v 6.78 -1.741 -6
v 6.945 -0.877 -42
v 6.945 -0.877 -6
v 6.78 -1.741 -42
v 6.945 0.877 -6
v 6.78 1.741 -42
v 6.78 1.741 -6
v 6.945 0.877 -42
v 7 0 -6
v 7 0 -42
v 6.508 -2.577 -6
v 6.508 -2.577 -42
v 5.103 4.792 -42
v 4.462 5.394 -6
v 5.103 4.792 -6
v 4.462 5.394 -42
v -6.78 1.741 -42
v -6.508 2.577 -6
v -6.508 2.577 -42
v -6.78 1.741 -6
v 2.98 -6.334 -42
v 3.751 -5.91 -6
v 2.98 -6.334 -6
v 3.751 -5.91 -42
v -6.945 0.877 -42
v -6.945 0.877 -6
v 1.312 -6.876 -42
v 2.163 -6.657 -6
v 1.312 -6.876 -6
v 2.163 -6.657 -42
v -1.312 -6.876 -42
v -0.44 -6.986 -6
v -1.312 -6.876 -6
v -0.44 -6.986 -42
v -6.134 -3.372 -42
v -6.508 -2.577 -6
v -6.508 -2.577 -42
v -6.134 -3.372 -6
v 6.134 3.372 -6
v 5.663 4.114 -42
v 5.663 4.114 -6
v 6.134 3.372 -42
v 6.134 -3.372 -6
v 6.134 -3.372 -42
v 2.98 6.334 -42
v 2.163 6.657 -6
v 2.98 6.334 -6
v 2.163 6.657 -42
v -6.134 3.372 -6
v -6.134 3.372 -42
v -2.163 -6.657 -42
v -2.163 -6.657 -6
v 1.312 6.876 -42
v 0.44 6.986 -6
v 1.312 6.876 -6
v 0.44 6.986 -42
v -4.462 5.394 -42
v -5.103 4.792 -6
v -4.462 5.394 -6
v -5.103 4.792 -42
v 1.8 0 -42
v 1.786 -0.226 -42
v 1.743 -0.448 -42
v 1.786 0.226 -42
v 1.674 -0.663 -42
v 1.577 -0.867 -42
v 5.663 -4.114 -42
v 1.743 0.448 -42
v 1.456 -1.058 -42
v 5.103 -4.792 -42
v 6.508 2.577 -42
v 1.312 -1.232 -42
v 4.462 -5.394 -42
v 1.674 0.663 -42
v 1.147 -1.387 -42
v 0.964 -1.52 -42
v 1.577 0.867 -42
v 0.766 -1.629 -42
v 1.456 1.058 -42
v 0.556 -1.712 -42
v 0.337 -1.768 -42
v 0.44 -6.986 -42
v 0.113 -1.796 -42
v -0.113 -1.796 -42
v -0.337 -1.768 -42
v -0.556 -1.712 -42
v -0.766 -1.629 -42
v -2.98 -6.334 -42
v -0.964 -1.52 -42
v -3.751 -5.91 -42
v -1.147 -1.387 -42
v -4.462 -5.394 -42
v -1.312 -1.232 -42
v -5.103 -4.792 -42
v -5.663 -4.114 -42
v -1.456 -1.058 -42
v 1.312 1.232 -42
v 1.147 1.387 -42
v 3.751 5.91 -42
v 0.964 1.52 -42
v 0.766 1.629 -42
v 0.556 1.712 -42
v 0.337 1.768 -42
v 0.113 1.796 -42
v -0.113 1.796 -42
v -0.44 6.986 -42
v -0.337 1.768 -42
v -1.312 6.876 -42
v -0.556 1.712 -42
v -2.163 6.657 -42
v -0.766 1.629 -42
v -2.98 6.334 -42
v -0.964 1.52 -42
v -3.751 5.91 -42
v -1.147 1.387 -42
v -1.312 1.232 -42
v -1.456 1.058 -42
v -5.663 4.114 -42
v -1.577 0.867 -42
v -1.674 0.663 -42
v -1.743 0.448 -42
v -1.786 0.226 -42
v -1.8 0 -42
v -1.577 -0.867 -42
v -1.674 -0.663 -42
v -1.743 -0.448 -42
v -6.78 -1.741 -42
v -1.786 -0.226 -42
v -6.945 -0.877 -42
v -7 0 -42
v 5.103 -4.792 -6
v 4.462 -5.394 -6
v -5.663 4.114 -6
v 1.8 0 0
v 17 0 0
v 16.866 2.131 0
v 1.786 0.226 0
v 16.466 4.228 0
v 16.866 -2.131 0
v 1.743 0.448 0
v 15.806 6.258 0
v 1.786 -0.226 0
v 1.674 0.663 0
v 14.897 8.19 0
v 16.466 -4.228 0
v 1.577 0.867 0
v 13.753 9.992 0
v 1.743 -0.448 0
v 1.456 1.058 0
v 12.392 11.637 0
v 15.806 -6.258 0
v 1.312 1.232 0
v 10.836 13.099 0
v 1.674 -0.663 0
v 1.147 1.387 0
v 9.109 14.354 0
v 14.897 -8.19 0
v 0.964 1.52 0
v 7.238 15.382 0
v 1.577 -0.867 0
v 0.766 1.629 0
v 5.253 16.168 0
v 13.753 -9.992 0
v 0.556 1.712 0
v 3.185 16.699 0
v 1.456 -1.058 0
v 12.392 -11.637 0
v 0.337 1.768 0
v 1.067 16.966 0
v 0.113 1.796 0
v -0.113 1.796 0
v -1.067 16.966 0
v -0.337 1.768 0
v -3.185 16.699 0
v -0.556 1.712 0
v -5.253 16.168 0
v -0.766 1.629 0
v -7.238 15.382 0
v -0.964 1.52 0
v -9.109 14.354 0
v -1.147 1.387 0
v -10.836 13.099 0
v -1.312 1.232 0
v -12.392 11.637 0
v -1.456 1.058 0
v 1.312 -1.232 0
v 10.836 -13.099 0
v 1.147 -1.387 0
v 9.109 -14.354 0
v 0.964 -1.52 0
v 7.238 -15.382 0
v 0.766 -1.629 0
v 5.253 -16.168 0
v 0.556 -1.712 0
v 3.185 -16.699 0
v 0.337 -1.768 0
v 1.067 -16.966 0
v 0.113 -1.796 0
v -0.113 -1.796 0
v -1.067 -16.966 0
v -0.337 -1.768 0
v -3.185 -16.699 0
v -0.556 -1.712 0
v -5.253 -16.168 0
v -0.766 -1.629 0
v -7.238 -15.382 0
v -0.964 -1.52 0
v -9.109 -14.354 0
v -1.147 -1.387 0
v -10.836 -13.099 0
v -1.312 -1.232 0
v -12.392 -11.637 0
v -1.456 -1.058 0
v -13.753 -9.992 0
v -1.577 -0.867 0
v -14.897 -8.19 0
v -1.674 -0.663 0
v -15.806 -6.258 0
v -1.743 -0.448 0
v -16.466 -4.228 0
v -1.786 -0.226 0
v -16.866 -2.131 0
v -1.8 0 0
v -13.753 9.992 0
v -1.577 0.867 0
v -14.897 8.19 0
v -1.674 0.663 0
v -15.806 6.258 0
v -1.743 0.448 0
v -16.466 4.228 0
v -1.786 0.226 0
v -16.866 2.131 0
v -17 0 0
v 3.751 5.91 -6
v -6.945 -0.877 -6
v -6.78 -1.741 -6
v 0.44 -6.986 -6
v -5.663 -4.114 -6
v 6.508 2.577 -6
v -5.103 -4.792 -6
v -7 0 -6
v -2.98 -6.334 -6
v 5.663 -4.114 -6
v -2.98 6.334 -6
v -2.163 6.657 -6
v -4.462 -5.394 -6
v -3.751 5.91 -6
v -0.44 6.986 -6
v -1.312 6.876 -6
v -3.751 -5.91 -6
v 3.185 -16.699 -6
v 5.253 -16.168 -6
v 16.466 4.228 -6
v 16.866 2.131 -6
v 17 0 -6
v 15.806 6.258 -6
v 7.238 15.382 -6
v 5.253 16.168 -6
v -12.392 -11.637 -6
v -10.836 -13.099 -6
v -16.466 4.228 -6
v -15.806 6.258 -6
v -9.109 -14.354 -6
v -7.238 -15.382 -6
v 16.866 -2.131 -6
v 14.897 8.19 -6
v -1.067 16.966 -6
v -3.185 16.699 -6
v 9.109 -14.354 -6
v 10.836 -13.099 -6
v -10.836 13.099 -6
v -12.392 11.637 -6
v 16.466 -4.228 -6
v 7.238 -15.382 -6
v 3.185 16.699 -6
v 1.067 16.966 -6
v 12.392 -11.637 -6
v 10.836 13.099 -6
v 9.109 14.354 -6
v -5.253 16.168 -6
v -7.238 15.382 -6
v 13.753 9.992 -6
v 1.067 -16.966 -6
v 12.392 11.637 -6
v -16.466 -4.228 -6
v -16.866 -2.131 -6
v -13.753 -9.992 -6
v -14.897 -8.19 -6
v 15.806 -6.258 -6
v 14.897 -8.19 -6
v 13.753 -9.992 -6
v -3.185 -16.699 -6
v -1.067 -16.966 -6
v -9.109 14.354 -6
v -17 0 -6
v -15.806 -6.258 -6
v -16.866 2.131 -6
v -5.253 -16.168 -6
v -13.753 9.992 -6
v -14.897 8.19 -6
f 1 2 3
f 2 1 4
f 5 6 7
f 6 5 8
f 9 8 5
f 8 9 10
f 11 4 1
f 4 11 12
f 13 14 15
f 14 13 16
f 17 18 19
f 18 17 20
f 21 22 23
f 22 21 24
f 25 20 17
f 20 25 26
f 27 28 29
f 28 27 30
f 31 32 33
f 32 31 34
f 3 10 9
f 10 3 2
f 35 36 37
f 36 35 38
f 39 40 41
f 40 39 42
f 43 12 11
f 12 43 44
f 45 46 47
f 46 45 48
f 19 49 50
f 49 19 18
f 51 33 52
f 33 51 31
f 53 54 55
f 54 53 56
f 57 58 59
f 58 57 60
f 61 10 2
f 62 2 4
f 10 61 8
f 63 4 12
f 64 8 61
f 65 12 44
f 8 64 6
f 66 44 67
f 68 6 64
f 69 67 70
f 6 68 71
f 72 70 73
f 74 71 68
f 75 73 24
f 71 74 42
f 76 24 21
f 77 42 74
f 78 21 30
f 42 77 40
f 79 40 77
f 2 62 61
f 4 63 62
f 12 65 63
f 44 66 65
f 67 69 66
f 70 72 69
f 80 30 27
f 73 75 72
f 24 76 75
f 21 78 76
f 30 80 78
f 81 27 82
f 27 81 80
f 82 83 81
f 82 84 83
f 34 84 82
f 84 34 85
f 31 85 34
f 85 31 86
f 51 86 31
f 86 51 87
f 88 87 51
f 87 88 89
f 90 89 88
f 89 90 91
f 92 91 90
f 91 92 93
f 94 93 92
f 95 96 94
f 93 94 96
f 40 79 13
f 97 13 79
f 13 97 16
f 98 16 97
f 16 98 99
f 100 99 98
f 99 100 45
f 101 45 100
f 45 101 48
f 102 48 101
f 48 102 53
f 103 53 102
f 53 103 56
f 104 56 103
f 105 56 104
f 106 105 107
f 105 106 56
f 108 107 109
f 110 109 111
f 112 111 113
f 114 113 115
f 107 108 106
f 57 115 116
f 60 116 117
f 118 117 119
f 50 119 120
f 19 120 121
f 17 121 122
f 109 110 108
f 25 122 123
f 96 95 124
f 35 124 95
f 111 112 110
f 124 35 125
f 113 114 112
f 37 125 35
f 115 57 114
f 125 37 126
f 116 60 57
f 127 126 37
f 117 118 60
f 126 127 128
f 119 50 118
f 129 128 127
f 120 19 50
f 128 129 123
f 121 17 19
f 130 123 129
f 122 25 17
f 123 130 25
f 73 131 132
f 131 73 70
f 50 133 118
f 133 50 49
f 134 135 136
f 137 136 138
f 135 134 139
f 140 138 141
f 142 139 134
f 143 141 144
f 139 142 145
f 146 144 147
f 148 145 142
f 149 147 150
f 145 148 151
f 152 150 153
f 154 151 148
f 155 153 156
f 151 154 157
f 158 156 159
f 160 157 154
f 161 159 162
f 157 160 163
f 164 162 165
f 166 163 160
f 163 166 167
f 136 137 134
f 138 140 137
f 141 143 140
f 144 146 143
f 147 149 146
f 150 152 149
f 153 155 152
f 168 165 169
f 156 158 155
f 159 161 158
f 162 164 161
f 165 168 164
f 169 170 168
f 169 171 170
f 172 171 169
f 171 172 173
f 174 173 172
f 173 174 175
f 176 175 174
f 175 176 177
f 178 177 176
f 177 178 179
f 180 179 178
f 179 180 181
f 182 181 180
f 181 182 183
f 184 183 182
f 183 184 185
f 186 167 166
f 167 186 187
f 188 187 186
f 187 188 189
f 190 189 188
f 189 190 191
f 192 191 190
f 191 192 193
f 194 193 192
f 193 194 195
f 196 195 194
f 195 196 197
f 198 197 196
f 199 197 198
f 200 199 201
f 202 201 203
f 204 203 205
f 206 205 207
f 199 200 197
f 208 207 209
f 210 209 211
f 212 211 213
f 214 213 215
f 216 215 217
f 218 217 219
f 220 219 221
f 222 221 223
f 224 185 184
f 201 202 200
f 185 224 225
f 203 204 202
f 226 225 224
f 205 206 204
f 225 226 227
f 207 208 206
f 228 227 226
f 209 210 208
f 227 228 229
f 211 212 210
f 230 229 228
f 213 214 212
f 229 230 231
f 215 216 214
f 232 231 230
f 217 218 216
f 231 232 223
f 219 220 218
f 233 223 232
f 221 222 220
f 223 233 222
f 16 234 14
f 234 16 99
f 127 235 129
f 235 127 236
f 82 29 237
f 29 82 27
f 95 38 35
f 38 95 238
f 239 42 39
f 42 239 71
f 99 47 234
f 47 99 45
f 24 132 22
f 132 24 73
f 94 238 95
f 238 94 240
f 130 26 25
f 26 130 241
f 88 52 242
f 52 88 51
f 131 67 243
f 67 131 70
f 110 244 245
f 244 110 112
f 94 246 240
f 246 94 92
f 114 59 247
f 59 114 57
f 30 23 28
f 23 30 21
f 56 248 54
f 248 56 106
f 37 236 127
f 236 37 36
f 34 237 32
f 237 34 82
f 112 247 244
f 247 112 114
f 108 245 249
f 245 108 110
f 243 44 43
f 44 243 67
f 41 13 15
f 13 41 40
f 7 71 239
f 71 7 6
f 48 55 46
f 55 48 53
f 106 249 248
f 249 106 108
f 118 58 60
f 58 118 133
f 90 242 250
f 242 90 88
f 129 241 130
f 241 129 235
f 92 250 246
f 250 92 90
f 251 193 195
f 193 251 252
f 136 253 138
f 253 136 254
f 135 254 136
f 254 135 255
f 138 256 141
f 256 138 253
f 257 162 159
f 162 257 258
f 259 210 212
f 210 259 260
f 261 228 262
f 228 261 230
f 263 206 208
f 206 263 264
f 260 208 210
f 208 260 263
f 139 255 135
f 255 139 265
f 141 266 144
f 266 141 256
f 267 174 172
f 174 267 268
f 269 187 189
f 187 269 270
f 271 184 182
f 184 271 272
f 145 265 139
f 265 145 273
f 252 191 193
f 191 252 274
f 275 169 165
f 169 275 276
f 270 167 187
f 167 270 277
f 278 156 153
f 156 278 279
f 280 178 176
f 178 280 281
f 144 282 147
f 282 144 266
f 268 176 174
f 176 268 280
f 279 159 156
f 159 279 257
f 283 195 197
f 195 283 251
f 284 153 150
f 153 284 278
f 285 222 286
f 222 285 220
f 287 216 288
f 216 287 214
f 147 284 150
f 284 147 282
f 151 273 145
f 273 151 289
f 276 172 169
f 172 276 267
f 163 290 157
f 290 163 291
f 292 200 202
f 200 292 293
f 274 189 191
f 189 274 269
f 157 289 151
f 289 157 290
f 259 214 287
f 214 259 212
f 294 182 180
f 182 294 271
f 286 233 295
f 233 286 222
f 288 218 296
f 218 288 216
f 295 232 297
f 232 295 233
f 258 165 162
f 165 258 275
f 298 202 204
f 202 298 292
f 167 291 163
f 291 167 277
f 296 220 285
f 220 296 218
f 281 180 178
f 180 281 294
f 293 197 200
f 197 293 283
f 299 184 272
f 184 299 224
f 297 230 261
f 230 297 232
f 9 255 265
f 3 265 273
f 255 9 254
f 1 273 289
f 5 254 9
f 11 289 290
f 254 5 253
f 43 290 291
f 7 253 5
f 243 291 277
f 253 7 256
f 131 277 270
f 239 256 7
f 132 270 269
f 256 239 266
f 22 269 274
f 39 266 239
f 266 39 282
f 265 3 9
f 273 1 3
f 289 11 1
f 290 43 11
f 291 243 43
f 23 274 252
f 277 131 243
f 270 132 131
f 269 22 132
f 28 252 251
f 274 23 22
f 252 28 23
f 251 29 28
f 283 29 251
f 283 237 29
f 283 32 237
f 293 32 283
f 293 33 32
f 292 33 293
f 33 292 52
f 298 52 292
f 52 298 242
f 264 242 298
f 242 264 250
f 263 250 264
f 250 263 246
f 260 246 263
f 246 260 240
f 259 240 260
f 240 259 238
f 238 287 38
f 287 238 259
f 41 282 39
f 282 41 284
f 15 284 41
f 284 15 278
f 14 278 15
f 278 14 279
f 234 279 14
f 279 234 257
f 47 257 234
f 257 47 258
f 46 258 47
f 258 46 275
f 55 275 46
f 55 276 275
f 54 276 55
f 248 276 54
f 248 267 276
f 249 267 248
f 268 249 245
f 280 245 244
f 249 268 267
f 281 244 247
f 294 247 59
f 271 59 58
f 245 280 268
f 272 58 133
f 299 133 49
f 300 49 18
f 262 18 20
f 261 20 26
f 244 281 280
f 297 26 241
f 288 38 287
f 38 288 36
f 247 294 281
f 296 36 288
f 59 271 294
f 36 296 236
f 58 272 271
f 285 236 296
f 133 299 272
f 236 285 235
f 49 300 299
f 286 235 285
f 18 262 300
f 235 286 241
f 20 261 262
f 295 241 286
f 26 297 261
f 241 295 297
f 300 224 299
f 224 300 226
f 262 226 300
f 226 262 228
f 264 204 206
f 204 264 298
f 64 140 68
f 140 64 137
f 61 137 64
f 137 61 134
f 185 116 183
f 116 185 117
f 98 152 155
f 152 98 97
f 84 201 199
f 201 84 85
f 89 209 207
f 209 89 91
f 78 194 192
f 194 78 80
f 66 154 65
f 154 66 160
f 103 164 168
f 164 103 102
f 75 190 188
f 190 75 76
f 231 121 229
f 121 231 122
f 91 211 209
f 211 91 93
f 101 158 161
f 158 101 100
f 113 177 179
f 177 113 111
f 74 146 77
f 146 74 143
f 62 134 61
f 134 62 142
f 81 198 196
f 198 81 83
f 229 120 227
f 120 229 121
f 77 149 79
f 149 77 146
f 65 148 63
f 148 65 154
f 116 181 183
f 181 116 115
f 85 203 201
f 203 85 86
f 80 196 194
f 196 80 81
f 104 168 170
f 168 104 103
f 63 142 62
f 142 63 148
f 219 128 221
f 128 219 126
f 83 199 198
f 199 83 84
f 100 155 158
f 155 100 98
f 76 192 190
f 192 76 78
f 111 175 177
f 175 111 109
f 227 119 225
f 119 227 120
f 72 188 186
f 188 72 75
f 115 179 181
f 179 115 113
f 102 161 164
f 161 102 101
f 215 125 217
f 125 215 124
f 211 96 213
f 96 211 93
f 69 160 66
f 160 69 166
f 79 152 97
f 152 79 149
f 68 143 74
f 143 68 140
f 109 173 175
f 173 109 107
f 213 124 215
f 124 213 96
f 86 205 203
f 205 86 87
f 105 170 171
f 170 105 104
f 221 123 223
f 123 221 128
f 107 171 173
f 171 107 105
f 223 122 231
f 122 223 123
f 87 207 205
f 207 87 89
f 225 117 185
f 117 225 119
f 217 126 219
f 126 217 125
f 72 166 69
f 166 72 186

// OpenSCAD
$fn = 50;


difference() {
	union() {
		translate(v = [0, 0, -42.0000000000]) {
			cylinder(h = 42, r = 7.0000000000);
		}
		translate(v = [0, 0, -6.0000000000]) {
			cylinder(h = 6, r = 17.0000000000);
		}
	}
	union() {
		#translate(v = [0, 0, -42]) {
			cylinder(h = 42, r = 1.8000000000);
		}
	}
}
